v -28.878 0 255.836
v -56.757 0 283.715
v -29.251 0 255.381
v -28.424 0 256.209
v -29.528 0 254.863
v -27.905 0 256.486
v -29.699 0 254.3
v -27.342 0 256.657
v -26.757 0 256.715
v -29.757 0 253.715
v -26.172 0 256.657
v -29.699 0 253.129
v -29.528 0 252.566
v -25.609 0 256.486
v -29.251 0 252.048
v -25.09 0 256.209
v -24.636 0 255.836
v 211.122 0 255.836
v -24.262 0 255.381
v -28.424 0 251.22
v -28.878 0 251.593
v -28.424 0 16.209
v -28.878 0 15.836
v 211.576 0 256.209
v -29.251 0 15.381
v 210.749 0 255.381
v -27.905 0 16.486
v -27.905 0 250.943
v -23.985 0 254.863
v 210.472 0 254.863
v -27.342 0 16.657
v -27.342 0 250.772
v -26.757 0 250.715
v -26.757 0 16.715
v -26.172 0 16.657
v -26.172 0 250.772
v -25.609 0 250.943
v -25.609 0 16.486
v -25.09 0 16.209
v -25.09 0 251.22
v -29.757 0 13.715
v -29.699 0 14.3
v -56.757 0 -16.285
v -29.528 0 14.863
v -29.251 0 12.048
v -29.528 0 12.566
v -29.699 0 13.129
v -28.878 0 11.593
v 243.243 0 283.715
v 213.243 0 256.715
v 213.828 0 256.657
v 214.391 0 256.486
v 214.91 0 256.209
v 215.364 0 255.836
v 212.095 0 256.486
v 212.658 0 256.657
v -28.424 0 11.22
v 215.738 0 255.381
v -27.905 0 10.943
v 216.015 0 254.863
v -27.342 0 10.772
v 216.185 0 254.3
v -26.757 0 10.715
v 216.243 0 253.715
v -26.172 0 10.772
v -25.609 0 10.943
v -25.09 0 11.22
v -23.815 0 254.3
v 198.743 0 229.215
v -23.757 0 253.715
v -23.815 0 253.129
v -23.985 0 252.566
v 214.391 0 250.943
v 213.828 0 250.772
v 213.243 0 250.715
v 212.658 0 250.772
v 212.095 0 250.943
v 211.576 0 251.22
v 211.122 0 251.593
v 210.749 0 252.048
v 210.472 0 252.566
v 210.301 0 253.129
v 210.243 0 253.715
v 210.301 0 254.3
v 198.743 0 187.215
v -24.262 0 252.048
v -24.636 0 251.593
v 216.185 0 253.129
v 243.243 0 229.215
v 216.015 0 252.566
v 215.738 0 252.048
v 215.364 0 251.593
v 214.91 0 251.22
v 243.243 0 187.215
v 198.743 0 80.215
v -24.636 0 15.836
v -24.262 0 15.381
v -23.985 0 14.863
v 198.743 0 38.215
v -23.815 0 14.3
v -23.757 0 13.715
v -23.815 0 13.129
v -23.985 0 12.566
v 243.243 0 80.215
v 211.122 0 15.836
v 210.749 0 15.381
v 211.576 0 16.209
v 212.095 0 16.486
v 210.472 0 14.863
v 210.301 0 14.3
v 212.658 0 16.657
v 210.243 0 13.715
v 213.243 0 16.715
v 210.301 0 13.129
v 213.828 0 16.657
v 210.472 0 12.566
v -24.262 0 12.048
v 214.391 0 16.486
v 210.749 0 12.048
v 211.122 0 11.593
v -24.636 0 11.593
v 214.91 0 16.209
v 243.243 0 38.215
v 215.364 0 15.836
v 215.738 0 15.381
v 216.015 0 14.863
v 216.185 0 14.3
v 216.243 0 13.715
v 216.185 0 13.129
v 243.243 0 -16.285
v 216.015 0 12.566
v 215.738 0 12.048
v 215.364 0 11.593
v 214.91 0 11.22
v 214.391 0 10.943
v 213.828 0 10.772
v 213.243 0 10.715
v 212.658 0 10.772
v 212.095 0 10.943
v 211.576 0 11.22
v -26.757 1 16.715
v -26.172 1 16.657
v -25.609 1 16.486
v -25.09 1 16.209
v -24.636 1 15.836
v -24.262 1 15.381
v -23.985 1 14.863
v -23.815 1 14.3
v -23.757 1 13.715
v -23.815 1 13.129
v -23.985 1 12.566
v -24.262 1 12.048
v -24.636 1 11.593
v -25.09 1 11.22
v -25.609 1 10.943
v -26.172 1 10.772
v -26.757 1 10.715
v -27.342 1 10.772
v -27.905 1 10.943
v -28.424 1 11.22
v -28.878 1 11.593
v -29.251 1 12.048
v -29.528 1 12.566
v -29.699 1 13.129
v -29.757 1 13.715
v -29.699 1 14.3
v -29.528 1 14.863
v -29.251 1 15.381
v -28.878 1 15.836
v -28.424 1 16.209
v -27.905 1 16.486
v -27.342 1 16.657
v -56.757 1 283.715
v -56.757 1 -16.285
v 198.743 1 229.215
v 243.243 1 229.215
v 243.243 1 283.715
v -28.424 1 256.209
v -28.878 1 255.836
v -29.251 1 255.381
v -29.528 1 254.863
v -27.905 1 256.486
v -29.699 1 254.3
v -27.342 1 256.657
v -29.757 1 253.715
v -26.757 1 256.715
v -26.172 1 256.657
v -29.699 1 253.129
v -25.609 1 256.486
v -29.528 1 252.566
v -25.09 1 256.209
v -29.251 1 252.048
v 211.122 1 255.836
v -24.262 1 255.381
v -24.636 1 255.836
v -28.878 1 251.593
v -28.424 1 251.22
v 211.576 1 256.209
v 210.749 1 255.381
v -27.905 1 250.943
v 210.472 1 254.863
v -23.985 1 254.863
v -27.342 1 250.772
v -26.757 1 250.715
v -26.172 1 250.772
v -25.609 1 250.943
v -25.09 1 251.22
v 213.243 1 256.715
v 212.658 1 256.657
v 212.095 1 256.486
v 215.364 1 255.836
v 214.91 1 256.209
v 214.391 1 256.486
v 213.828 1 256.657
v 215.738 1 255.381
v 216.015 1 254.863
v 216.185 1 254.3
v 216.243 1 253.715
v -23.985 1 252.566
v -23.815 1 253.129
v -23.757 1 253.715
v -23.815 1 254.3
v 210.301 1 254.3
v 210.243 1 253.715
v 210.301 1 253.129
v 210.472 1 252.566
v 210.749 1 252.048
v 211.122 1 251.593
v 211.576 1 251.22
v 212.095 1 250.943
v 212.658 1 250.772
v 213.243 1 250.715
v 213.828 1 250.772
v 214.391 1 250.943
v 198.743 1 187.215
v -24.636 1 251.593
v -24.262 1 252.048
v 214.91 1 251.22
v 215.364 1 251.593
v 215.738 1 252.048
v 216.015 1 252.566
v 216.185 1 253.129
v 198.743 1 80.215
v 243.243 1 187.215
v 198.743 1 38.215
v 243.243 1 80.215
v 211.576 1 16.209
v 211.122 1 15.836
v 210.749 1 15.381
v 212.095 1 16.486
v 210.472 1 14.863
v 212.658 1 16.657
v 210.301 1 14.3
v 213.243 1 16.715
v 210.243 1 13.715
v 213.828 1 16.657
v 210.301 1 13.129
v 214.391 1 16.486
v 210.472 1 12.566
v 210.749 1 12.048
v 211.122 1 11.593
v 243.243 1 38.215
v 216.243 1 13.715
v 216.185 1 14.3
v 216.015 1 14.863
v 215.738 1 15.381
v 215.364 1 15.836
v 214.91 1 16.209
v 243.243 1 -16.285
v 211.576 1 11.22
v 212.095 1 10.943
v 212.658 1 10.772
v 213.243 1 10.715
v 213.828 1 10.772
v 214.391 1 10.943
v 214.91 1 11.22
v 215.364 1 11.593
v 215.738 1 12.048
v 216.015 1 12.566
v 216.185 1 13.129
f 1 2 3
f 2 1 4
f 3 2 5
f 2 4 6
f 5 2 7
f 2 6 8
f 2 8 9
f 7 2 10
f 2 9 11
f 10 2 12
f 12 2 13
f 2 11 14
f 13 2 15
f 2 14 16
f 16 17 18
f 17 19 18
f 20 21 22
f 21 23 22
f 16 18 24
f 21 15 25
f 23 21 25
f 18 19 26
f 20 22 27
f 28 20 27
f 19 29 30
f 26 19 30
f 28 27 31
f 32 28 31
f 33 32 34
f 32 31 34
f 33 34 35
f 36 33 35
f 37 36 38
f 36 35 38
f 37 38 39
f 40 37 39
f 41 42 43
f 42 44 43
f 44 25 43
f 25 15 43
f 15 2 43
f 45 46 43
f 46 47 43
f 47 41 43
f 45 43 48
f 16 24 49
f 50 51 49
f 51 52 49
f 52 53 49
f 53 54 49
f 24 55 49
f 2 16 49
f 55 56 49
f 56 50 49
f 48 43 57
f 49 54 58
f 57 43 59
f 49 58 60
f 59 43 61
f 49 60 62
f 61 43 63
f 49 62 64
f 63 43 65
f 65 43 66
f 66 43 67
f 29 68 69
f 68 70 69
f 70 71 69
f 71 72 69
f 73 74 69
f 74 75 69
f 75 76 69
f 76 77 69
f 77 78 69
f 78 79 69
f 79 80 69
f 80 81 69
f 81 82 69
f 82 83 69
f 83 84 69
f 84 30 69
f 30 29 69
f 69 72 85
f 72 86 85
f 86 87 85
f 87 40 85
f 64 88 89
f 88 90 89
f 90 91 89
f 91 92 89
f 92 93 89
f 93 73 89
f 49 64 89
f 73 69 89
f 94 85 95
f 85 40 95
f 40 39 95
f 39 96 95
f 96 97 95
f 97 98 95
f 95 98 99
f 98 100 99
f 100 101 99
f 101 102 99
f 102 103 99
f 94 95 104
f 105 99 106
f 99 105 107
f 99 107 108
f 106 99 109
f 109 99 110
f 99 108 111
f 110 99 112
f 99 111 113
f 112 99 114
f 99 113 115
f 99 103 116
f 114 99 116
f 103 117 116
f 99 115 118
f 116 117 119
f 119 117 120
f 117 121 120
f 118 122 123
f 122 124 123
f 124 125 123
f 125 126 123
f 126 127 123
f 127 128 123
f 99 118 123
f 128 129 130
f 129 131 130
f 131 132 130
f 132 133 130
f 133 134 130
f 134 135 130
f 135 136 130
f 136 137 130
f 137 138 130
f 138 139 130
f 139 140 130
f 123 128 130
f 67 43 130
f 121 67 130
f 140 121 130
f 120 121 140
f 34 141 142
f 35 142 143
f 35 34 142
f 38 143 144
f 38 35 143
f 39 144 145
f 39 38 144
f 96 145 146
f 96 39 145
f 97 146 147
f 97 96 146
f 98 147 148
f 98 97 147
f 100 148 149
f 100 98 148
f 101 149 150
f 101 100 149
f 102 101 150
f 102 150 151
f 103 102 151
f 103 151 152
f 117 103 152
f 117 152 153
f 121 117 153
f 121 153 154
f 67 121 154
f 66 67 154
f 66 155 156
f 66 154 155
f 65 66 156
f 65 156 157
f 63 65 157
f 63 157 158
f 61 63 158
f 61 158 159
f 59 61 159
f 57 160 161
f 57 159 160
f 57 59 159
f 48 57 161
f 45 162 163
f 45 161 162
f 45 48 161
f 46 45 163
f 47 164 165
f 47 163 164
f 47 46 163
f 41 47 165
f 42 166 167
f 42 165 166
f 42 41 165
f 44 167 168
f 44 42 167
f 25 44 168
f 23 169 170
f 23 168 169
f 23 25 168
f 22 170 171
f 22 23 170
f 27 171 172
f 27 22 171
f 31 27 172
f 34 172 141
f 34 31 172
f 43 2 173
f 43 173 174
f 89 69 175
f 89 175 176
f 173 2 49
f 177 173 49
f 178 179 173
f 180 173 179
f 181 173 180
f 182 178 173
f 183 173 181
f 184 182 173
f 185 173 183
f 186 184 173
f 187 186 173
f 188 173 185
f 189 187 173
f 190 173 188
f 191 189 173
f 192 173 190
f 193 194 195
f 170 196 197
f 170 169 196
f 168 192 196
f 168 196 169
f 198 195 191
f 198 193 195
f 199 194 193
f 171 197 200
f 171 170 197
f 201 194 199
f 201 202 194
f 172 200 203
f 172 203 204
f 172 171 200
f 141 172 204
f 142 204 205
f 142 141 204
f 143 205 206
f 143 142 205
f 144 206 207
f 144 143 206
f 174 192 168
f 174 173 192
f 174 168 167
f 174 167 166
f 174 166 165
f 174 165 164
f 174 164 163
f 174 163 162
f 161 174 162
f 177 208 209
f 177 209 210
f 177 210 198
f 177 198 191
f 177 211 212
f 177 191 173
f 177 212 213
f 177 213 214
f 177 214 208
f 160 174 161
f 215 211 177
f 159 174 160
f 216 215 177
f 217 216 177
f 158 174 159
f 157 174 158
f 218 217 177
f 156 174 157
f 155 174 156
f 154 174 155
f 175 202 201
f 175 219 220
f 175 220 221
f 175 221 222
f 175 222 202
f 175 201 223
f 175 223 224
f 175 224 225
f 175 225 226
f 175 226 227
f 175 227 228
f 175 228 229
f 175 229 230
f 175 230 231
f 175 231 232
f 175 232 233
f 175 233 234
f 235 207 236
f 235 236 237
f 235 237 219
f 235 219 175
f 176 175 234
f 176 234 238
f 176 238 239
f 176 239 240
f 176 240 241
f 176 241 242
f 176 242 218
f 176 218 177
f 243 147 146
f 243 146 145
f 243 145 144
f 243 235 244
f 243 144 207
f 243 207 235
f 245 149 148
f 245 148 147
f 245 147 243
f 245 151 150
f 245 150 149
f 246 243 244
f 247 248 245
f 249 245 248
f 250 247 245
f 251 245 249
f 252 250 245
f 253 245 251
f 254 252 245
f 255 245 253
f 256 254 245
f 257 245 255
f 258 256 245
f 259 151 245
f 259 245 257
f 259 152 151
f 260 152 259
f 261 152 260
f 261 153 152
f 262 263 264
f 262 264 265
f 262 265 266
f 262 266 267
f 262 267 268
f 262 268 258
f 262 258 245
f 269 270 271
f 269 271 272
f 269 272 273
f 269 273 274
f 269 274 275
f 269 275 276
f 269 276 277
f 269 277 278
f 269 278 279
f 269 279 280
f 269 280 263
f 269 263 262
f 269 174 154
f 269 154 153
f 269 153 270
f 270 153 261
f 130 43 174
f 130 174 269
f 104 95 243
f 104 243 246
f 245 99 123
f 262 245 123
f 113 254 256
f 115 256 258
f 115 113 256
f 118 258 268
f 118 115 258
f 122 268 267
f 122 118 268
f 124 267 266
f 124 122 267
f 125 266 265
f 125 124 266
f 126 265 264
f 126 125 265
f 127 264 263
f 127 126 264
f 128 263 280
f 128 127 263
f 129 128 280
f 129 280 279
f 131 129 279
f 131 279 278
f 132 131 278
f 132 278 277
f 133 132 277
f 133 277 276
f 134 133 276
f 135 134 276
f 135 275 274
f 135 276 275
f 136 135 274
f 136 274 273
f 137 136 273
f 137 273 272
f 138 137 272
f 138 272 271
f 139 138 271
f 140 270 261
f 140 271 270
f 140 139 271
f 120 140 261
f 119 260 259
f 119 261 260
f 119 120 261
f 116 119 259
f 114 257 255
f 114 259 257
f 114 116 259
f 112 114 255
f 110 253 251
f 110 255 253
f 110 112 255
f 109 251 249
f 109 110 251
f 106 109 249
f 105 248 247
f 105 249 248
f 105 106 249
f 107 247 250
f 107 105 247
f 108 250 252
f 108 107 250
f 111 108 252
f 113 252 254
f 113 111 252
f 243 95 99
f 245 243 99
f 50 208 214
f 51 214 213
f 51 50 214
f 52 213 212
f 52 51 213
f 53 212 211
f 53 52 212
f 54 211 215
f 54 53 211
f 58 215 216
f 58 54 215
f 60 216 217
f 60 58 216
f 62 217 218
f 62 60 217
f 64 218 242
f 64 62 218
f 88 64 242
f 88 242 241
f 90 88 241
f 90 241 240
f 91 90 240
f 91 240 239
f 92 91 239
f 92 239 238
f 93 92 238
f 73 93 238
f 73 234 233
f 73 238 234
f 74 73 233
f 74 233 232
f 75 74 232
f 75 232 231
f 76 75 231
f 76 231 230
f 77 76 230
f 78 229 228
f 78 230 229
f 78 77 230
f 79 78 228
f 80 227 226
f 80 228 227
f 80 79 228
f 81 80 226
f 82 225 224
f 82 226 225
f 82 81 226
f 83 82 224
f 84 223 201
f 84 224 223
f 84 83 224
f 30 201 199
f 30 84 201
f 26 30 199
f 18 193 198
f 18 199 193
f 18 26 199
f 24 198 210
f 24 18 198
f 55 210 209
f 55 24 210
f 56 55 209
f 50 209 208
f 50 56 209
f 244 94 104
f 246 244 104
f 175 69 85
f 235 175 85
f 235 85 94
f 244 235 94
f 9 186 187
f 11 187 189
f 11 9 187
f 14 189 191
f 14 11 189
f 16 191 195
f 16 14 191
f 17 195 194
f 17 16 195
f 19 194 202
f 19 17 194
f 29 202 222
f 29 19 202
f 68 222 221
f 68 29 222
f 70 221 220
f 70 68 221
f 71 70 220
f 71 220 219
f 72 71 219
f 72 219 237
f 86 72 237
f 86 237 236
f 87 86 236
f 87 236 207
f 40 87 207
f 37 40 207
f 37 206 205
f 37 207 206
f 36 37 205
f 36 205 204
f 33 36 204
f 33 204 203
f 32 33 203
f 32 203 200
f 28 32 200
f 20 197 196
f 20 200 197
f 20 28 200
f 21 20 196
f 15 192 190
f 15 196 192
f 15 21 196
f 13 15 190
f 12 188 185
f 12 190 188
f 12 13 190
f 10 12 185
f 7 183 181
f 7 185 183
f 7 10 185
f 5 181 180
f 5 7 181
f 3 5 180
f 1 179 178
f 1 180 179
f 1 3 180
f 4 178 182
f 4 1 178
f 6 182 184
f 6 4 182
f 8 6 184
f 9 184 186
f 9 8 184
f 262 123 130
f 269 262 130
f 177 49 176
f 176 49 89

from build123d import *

# Parameters (mm, degrees)
SKETCH_1_W          = 300
SKETCH_1_H          = 300
EXTRUDE_1_DEPTH     = 1
SKETCH_2_R          = 3
CUT_EXTRUDE_2_DEPTH = 374.714004721
SKETCH_3_W          = 44.5
SKETCH_3_H          = 42
CUT_EXTRUDE_4_DEPTH = 374.714004721


with BuildPart() as part:
    # 草图1 → 凸台-拉伸1 (new body)
    with BuildSketch(Plane(origin=(0, 0, 0), x_dir=(1, 0, 0), z_dir=(0, 1, 0))):
        with Locations((93.243141409, -133.714524624)):
            Rectangle(SKETCH_1_W, SKETCH_1_H)
    extrude(amount=EXTRUDE_1_DEPTH)

    # 草图2 → 切除-拉伸2 (cut, through all)
    with BuildSketch(Plane(origin=(0, 0, 0), x_dir=(1, 0, 0), z_dir=(0, 1, 0))):
        with Locations(Location((-26.756858591, -13.714524624, 0), (0, 0, 270))):
            Circle(SKETCH_2_R)
        with Locations(Location((213.243141409, -13.714524624, 0), (0, 0, 270))):
            Circle(SKETCH_2_R)
        with Locations(Location((213.243141409, -253.714524624, 0), (0, 0, 270))):
            Circle(SKETCH_2_R)
        with Locations(Location((-26.756858591, -253.714524624, 0), (0, 0, 270))):
            Circle(SKETCH_2_R)
    extrude(amount=CUT_EXTRUDE_2_DEPTH, mode=Mode.SUBTRACT)

    # 草图3 → 切除-拉伸4 (cut, through all)
    with BuildSketch(Plane(origin=(0, 0, 0), x_dir=(1, 0, 0), z_dir=(0, 1, 0))):
        with Locations((220.993141409, -208.214524624)):
            Rectangle(SKETCH_3_W, SKETCH_3_H)
        with Locations((220.993141409, -59.214524624)):
            Rectangle(SKETCH_3_W, SKETCH_3_H)
    extrude(amount=CUT_EXTRUDE_4_DEPTH, mode=Mode.SUBTRACT)


solid = part.part
